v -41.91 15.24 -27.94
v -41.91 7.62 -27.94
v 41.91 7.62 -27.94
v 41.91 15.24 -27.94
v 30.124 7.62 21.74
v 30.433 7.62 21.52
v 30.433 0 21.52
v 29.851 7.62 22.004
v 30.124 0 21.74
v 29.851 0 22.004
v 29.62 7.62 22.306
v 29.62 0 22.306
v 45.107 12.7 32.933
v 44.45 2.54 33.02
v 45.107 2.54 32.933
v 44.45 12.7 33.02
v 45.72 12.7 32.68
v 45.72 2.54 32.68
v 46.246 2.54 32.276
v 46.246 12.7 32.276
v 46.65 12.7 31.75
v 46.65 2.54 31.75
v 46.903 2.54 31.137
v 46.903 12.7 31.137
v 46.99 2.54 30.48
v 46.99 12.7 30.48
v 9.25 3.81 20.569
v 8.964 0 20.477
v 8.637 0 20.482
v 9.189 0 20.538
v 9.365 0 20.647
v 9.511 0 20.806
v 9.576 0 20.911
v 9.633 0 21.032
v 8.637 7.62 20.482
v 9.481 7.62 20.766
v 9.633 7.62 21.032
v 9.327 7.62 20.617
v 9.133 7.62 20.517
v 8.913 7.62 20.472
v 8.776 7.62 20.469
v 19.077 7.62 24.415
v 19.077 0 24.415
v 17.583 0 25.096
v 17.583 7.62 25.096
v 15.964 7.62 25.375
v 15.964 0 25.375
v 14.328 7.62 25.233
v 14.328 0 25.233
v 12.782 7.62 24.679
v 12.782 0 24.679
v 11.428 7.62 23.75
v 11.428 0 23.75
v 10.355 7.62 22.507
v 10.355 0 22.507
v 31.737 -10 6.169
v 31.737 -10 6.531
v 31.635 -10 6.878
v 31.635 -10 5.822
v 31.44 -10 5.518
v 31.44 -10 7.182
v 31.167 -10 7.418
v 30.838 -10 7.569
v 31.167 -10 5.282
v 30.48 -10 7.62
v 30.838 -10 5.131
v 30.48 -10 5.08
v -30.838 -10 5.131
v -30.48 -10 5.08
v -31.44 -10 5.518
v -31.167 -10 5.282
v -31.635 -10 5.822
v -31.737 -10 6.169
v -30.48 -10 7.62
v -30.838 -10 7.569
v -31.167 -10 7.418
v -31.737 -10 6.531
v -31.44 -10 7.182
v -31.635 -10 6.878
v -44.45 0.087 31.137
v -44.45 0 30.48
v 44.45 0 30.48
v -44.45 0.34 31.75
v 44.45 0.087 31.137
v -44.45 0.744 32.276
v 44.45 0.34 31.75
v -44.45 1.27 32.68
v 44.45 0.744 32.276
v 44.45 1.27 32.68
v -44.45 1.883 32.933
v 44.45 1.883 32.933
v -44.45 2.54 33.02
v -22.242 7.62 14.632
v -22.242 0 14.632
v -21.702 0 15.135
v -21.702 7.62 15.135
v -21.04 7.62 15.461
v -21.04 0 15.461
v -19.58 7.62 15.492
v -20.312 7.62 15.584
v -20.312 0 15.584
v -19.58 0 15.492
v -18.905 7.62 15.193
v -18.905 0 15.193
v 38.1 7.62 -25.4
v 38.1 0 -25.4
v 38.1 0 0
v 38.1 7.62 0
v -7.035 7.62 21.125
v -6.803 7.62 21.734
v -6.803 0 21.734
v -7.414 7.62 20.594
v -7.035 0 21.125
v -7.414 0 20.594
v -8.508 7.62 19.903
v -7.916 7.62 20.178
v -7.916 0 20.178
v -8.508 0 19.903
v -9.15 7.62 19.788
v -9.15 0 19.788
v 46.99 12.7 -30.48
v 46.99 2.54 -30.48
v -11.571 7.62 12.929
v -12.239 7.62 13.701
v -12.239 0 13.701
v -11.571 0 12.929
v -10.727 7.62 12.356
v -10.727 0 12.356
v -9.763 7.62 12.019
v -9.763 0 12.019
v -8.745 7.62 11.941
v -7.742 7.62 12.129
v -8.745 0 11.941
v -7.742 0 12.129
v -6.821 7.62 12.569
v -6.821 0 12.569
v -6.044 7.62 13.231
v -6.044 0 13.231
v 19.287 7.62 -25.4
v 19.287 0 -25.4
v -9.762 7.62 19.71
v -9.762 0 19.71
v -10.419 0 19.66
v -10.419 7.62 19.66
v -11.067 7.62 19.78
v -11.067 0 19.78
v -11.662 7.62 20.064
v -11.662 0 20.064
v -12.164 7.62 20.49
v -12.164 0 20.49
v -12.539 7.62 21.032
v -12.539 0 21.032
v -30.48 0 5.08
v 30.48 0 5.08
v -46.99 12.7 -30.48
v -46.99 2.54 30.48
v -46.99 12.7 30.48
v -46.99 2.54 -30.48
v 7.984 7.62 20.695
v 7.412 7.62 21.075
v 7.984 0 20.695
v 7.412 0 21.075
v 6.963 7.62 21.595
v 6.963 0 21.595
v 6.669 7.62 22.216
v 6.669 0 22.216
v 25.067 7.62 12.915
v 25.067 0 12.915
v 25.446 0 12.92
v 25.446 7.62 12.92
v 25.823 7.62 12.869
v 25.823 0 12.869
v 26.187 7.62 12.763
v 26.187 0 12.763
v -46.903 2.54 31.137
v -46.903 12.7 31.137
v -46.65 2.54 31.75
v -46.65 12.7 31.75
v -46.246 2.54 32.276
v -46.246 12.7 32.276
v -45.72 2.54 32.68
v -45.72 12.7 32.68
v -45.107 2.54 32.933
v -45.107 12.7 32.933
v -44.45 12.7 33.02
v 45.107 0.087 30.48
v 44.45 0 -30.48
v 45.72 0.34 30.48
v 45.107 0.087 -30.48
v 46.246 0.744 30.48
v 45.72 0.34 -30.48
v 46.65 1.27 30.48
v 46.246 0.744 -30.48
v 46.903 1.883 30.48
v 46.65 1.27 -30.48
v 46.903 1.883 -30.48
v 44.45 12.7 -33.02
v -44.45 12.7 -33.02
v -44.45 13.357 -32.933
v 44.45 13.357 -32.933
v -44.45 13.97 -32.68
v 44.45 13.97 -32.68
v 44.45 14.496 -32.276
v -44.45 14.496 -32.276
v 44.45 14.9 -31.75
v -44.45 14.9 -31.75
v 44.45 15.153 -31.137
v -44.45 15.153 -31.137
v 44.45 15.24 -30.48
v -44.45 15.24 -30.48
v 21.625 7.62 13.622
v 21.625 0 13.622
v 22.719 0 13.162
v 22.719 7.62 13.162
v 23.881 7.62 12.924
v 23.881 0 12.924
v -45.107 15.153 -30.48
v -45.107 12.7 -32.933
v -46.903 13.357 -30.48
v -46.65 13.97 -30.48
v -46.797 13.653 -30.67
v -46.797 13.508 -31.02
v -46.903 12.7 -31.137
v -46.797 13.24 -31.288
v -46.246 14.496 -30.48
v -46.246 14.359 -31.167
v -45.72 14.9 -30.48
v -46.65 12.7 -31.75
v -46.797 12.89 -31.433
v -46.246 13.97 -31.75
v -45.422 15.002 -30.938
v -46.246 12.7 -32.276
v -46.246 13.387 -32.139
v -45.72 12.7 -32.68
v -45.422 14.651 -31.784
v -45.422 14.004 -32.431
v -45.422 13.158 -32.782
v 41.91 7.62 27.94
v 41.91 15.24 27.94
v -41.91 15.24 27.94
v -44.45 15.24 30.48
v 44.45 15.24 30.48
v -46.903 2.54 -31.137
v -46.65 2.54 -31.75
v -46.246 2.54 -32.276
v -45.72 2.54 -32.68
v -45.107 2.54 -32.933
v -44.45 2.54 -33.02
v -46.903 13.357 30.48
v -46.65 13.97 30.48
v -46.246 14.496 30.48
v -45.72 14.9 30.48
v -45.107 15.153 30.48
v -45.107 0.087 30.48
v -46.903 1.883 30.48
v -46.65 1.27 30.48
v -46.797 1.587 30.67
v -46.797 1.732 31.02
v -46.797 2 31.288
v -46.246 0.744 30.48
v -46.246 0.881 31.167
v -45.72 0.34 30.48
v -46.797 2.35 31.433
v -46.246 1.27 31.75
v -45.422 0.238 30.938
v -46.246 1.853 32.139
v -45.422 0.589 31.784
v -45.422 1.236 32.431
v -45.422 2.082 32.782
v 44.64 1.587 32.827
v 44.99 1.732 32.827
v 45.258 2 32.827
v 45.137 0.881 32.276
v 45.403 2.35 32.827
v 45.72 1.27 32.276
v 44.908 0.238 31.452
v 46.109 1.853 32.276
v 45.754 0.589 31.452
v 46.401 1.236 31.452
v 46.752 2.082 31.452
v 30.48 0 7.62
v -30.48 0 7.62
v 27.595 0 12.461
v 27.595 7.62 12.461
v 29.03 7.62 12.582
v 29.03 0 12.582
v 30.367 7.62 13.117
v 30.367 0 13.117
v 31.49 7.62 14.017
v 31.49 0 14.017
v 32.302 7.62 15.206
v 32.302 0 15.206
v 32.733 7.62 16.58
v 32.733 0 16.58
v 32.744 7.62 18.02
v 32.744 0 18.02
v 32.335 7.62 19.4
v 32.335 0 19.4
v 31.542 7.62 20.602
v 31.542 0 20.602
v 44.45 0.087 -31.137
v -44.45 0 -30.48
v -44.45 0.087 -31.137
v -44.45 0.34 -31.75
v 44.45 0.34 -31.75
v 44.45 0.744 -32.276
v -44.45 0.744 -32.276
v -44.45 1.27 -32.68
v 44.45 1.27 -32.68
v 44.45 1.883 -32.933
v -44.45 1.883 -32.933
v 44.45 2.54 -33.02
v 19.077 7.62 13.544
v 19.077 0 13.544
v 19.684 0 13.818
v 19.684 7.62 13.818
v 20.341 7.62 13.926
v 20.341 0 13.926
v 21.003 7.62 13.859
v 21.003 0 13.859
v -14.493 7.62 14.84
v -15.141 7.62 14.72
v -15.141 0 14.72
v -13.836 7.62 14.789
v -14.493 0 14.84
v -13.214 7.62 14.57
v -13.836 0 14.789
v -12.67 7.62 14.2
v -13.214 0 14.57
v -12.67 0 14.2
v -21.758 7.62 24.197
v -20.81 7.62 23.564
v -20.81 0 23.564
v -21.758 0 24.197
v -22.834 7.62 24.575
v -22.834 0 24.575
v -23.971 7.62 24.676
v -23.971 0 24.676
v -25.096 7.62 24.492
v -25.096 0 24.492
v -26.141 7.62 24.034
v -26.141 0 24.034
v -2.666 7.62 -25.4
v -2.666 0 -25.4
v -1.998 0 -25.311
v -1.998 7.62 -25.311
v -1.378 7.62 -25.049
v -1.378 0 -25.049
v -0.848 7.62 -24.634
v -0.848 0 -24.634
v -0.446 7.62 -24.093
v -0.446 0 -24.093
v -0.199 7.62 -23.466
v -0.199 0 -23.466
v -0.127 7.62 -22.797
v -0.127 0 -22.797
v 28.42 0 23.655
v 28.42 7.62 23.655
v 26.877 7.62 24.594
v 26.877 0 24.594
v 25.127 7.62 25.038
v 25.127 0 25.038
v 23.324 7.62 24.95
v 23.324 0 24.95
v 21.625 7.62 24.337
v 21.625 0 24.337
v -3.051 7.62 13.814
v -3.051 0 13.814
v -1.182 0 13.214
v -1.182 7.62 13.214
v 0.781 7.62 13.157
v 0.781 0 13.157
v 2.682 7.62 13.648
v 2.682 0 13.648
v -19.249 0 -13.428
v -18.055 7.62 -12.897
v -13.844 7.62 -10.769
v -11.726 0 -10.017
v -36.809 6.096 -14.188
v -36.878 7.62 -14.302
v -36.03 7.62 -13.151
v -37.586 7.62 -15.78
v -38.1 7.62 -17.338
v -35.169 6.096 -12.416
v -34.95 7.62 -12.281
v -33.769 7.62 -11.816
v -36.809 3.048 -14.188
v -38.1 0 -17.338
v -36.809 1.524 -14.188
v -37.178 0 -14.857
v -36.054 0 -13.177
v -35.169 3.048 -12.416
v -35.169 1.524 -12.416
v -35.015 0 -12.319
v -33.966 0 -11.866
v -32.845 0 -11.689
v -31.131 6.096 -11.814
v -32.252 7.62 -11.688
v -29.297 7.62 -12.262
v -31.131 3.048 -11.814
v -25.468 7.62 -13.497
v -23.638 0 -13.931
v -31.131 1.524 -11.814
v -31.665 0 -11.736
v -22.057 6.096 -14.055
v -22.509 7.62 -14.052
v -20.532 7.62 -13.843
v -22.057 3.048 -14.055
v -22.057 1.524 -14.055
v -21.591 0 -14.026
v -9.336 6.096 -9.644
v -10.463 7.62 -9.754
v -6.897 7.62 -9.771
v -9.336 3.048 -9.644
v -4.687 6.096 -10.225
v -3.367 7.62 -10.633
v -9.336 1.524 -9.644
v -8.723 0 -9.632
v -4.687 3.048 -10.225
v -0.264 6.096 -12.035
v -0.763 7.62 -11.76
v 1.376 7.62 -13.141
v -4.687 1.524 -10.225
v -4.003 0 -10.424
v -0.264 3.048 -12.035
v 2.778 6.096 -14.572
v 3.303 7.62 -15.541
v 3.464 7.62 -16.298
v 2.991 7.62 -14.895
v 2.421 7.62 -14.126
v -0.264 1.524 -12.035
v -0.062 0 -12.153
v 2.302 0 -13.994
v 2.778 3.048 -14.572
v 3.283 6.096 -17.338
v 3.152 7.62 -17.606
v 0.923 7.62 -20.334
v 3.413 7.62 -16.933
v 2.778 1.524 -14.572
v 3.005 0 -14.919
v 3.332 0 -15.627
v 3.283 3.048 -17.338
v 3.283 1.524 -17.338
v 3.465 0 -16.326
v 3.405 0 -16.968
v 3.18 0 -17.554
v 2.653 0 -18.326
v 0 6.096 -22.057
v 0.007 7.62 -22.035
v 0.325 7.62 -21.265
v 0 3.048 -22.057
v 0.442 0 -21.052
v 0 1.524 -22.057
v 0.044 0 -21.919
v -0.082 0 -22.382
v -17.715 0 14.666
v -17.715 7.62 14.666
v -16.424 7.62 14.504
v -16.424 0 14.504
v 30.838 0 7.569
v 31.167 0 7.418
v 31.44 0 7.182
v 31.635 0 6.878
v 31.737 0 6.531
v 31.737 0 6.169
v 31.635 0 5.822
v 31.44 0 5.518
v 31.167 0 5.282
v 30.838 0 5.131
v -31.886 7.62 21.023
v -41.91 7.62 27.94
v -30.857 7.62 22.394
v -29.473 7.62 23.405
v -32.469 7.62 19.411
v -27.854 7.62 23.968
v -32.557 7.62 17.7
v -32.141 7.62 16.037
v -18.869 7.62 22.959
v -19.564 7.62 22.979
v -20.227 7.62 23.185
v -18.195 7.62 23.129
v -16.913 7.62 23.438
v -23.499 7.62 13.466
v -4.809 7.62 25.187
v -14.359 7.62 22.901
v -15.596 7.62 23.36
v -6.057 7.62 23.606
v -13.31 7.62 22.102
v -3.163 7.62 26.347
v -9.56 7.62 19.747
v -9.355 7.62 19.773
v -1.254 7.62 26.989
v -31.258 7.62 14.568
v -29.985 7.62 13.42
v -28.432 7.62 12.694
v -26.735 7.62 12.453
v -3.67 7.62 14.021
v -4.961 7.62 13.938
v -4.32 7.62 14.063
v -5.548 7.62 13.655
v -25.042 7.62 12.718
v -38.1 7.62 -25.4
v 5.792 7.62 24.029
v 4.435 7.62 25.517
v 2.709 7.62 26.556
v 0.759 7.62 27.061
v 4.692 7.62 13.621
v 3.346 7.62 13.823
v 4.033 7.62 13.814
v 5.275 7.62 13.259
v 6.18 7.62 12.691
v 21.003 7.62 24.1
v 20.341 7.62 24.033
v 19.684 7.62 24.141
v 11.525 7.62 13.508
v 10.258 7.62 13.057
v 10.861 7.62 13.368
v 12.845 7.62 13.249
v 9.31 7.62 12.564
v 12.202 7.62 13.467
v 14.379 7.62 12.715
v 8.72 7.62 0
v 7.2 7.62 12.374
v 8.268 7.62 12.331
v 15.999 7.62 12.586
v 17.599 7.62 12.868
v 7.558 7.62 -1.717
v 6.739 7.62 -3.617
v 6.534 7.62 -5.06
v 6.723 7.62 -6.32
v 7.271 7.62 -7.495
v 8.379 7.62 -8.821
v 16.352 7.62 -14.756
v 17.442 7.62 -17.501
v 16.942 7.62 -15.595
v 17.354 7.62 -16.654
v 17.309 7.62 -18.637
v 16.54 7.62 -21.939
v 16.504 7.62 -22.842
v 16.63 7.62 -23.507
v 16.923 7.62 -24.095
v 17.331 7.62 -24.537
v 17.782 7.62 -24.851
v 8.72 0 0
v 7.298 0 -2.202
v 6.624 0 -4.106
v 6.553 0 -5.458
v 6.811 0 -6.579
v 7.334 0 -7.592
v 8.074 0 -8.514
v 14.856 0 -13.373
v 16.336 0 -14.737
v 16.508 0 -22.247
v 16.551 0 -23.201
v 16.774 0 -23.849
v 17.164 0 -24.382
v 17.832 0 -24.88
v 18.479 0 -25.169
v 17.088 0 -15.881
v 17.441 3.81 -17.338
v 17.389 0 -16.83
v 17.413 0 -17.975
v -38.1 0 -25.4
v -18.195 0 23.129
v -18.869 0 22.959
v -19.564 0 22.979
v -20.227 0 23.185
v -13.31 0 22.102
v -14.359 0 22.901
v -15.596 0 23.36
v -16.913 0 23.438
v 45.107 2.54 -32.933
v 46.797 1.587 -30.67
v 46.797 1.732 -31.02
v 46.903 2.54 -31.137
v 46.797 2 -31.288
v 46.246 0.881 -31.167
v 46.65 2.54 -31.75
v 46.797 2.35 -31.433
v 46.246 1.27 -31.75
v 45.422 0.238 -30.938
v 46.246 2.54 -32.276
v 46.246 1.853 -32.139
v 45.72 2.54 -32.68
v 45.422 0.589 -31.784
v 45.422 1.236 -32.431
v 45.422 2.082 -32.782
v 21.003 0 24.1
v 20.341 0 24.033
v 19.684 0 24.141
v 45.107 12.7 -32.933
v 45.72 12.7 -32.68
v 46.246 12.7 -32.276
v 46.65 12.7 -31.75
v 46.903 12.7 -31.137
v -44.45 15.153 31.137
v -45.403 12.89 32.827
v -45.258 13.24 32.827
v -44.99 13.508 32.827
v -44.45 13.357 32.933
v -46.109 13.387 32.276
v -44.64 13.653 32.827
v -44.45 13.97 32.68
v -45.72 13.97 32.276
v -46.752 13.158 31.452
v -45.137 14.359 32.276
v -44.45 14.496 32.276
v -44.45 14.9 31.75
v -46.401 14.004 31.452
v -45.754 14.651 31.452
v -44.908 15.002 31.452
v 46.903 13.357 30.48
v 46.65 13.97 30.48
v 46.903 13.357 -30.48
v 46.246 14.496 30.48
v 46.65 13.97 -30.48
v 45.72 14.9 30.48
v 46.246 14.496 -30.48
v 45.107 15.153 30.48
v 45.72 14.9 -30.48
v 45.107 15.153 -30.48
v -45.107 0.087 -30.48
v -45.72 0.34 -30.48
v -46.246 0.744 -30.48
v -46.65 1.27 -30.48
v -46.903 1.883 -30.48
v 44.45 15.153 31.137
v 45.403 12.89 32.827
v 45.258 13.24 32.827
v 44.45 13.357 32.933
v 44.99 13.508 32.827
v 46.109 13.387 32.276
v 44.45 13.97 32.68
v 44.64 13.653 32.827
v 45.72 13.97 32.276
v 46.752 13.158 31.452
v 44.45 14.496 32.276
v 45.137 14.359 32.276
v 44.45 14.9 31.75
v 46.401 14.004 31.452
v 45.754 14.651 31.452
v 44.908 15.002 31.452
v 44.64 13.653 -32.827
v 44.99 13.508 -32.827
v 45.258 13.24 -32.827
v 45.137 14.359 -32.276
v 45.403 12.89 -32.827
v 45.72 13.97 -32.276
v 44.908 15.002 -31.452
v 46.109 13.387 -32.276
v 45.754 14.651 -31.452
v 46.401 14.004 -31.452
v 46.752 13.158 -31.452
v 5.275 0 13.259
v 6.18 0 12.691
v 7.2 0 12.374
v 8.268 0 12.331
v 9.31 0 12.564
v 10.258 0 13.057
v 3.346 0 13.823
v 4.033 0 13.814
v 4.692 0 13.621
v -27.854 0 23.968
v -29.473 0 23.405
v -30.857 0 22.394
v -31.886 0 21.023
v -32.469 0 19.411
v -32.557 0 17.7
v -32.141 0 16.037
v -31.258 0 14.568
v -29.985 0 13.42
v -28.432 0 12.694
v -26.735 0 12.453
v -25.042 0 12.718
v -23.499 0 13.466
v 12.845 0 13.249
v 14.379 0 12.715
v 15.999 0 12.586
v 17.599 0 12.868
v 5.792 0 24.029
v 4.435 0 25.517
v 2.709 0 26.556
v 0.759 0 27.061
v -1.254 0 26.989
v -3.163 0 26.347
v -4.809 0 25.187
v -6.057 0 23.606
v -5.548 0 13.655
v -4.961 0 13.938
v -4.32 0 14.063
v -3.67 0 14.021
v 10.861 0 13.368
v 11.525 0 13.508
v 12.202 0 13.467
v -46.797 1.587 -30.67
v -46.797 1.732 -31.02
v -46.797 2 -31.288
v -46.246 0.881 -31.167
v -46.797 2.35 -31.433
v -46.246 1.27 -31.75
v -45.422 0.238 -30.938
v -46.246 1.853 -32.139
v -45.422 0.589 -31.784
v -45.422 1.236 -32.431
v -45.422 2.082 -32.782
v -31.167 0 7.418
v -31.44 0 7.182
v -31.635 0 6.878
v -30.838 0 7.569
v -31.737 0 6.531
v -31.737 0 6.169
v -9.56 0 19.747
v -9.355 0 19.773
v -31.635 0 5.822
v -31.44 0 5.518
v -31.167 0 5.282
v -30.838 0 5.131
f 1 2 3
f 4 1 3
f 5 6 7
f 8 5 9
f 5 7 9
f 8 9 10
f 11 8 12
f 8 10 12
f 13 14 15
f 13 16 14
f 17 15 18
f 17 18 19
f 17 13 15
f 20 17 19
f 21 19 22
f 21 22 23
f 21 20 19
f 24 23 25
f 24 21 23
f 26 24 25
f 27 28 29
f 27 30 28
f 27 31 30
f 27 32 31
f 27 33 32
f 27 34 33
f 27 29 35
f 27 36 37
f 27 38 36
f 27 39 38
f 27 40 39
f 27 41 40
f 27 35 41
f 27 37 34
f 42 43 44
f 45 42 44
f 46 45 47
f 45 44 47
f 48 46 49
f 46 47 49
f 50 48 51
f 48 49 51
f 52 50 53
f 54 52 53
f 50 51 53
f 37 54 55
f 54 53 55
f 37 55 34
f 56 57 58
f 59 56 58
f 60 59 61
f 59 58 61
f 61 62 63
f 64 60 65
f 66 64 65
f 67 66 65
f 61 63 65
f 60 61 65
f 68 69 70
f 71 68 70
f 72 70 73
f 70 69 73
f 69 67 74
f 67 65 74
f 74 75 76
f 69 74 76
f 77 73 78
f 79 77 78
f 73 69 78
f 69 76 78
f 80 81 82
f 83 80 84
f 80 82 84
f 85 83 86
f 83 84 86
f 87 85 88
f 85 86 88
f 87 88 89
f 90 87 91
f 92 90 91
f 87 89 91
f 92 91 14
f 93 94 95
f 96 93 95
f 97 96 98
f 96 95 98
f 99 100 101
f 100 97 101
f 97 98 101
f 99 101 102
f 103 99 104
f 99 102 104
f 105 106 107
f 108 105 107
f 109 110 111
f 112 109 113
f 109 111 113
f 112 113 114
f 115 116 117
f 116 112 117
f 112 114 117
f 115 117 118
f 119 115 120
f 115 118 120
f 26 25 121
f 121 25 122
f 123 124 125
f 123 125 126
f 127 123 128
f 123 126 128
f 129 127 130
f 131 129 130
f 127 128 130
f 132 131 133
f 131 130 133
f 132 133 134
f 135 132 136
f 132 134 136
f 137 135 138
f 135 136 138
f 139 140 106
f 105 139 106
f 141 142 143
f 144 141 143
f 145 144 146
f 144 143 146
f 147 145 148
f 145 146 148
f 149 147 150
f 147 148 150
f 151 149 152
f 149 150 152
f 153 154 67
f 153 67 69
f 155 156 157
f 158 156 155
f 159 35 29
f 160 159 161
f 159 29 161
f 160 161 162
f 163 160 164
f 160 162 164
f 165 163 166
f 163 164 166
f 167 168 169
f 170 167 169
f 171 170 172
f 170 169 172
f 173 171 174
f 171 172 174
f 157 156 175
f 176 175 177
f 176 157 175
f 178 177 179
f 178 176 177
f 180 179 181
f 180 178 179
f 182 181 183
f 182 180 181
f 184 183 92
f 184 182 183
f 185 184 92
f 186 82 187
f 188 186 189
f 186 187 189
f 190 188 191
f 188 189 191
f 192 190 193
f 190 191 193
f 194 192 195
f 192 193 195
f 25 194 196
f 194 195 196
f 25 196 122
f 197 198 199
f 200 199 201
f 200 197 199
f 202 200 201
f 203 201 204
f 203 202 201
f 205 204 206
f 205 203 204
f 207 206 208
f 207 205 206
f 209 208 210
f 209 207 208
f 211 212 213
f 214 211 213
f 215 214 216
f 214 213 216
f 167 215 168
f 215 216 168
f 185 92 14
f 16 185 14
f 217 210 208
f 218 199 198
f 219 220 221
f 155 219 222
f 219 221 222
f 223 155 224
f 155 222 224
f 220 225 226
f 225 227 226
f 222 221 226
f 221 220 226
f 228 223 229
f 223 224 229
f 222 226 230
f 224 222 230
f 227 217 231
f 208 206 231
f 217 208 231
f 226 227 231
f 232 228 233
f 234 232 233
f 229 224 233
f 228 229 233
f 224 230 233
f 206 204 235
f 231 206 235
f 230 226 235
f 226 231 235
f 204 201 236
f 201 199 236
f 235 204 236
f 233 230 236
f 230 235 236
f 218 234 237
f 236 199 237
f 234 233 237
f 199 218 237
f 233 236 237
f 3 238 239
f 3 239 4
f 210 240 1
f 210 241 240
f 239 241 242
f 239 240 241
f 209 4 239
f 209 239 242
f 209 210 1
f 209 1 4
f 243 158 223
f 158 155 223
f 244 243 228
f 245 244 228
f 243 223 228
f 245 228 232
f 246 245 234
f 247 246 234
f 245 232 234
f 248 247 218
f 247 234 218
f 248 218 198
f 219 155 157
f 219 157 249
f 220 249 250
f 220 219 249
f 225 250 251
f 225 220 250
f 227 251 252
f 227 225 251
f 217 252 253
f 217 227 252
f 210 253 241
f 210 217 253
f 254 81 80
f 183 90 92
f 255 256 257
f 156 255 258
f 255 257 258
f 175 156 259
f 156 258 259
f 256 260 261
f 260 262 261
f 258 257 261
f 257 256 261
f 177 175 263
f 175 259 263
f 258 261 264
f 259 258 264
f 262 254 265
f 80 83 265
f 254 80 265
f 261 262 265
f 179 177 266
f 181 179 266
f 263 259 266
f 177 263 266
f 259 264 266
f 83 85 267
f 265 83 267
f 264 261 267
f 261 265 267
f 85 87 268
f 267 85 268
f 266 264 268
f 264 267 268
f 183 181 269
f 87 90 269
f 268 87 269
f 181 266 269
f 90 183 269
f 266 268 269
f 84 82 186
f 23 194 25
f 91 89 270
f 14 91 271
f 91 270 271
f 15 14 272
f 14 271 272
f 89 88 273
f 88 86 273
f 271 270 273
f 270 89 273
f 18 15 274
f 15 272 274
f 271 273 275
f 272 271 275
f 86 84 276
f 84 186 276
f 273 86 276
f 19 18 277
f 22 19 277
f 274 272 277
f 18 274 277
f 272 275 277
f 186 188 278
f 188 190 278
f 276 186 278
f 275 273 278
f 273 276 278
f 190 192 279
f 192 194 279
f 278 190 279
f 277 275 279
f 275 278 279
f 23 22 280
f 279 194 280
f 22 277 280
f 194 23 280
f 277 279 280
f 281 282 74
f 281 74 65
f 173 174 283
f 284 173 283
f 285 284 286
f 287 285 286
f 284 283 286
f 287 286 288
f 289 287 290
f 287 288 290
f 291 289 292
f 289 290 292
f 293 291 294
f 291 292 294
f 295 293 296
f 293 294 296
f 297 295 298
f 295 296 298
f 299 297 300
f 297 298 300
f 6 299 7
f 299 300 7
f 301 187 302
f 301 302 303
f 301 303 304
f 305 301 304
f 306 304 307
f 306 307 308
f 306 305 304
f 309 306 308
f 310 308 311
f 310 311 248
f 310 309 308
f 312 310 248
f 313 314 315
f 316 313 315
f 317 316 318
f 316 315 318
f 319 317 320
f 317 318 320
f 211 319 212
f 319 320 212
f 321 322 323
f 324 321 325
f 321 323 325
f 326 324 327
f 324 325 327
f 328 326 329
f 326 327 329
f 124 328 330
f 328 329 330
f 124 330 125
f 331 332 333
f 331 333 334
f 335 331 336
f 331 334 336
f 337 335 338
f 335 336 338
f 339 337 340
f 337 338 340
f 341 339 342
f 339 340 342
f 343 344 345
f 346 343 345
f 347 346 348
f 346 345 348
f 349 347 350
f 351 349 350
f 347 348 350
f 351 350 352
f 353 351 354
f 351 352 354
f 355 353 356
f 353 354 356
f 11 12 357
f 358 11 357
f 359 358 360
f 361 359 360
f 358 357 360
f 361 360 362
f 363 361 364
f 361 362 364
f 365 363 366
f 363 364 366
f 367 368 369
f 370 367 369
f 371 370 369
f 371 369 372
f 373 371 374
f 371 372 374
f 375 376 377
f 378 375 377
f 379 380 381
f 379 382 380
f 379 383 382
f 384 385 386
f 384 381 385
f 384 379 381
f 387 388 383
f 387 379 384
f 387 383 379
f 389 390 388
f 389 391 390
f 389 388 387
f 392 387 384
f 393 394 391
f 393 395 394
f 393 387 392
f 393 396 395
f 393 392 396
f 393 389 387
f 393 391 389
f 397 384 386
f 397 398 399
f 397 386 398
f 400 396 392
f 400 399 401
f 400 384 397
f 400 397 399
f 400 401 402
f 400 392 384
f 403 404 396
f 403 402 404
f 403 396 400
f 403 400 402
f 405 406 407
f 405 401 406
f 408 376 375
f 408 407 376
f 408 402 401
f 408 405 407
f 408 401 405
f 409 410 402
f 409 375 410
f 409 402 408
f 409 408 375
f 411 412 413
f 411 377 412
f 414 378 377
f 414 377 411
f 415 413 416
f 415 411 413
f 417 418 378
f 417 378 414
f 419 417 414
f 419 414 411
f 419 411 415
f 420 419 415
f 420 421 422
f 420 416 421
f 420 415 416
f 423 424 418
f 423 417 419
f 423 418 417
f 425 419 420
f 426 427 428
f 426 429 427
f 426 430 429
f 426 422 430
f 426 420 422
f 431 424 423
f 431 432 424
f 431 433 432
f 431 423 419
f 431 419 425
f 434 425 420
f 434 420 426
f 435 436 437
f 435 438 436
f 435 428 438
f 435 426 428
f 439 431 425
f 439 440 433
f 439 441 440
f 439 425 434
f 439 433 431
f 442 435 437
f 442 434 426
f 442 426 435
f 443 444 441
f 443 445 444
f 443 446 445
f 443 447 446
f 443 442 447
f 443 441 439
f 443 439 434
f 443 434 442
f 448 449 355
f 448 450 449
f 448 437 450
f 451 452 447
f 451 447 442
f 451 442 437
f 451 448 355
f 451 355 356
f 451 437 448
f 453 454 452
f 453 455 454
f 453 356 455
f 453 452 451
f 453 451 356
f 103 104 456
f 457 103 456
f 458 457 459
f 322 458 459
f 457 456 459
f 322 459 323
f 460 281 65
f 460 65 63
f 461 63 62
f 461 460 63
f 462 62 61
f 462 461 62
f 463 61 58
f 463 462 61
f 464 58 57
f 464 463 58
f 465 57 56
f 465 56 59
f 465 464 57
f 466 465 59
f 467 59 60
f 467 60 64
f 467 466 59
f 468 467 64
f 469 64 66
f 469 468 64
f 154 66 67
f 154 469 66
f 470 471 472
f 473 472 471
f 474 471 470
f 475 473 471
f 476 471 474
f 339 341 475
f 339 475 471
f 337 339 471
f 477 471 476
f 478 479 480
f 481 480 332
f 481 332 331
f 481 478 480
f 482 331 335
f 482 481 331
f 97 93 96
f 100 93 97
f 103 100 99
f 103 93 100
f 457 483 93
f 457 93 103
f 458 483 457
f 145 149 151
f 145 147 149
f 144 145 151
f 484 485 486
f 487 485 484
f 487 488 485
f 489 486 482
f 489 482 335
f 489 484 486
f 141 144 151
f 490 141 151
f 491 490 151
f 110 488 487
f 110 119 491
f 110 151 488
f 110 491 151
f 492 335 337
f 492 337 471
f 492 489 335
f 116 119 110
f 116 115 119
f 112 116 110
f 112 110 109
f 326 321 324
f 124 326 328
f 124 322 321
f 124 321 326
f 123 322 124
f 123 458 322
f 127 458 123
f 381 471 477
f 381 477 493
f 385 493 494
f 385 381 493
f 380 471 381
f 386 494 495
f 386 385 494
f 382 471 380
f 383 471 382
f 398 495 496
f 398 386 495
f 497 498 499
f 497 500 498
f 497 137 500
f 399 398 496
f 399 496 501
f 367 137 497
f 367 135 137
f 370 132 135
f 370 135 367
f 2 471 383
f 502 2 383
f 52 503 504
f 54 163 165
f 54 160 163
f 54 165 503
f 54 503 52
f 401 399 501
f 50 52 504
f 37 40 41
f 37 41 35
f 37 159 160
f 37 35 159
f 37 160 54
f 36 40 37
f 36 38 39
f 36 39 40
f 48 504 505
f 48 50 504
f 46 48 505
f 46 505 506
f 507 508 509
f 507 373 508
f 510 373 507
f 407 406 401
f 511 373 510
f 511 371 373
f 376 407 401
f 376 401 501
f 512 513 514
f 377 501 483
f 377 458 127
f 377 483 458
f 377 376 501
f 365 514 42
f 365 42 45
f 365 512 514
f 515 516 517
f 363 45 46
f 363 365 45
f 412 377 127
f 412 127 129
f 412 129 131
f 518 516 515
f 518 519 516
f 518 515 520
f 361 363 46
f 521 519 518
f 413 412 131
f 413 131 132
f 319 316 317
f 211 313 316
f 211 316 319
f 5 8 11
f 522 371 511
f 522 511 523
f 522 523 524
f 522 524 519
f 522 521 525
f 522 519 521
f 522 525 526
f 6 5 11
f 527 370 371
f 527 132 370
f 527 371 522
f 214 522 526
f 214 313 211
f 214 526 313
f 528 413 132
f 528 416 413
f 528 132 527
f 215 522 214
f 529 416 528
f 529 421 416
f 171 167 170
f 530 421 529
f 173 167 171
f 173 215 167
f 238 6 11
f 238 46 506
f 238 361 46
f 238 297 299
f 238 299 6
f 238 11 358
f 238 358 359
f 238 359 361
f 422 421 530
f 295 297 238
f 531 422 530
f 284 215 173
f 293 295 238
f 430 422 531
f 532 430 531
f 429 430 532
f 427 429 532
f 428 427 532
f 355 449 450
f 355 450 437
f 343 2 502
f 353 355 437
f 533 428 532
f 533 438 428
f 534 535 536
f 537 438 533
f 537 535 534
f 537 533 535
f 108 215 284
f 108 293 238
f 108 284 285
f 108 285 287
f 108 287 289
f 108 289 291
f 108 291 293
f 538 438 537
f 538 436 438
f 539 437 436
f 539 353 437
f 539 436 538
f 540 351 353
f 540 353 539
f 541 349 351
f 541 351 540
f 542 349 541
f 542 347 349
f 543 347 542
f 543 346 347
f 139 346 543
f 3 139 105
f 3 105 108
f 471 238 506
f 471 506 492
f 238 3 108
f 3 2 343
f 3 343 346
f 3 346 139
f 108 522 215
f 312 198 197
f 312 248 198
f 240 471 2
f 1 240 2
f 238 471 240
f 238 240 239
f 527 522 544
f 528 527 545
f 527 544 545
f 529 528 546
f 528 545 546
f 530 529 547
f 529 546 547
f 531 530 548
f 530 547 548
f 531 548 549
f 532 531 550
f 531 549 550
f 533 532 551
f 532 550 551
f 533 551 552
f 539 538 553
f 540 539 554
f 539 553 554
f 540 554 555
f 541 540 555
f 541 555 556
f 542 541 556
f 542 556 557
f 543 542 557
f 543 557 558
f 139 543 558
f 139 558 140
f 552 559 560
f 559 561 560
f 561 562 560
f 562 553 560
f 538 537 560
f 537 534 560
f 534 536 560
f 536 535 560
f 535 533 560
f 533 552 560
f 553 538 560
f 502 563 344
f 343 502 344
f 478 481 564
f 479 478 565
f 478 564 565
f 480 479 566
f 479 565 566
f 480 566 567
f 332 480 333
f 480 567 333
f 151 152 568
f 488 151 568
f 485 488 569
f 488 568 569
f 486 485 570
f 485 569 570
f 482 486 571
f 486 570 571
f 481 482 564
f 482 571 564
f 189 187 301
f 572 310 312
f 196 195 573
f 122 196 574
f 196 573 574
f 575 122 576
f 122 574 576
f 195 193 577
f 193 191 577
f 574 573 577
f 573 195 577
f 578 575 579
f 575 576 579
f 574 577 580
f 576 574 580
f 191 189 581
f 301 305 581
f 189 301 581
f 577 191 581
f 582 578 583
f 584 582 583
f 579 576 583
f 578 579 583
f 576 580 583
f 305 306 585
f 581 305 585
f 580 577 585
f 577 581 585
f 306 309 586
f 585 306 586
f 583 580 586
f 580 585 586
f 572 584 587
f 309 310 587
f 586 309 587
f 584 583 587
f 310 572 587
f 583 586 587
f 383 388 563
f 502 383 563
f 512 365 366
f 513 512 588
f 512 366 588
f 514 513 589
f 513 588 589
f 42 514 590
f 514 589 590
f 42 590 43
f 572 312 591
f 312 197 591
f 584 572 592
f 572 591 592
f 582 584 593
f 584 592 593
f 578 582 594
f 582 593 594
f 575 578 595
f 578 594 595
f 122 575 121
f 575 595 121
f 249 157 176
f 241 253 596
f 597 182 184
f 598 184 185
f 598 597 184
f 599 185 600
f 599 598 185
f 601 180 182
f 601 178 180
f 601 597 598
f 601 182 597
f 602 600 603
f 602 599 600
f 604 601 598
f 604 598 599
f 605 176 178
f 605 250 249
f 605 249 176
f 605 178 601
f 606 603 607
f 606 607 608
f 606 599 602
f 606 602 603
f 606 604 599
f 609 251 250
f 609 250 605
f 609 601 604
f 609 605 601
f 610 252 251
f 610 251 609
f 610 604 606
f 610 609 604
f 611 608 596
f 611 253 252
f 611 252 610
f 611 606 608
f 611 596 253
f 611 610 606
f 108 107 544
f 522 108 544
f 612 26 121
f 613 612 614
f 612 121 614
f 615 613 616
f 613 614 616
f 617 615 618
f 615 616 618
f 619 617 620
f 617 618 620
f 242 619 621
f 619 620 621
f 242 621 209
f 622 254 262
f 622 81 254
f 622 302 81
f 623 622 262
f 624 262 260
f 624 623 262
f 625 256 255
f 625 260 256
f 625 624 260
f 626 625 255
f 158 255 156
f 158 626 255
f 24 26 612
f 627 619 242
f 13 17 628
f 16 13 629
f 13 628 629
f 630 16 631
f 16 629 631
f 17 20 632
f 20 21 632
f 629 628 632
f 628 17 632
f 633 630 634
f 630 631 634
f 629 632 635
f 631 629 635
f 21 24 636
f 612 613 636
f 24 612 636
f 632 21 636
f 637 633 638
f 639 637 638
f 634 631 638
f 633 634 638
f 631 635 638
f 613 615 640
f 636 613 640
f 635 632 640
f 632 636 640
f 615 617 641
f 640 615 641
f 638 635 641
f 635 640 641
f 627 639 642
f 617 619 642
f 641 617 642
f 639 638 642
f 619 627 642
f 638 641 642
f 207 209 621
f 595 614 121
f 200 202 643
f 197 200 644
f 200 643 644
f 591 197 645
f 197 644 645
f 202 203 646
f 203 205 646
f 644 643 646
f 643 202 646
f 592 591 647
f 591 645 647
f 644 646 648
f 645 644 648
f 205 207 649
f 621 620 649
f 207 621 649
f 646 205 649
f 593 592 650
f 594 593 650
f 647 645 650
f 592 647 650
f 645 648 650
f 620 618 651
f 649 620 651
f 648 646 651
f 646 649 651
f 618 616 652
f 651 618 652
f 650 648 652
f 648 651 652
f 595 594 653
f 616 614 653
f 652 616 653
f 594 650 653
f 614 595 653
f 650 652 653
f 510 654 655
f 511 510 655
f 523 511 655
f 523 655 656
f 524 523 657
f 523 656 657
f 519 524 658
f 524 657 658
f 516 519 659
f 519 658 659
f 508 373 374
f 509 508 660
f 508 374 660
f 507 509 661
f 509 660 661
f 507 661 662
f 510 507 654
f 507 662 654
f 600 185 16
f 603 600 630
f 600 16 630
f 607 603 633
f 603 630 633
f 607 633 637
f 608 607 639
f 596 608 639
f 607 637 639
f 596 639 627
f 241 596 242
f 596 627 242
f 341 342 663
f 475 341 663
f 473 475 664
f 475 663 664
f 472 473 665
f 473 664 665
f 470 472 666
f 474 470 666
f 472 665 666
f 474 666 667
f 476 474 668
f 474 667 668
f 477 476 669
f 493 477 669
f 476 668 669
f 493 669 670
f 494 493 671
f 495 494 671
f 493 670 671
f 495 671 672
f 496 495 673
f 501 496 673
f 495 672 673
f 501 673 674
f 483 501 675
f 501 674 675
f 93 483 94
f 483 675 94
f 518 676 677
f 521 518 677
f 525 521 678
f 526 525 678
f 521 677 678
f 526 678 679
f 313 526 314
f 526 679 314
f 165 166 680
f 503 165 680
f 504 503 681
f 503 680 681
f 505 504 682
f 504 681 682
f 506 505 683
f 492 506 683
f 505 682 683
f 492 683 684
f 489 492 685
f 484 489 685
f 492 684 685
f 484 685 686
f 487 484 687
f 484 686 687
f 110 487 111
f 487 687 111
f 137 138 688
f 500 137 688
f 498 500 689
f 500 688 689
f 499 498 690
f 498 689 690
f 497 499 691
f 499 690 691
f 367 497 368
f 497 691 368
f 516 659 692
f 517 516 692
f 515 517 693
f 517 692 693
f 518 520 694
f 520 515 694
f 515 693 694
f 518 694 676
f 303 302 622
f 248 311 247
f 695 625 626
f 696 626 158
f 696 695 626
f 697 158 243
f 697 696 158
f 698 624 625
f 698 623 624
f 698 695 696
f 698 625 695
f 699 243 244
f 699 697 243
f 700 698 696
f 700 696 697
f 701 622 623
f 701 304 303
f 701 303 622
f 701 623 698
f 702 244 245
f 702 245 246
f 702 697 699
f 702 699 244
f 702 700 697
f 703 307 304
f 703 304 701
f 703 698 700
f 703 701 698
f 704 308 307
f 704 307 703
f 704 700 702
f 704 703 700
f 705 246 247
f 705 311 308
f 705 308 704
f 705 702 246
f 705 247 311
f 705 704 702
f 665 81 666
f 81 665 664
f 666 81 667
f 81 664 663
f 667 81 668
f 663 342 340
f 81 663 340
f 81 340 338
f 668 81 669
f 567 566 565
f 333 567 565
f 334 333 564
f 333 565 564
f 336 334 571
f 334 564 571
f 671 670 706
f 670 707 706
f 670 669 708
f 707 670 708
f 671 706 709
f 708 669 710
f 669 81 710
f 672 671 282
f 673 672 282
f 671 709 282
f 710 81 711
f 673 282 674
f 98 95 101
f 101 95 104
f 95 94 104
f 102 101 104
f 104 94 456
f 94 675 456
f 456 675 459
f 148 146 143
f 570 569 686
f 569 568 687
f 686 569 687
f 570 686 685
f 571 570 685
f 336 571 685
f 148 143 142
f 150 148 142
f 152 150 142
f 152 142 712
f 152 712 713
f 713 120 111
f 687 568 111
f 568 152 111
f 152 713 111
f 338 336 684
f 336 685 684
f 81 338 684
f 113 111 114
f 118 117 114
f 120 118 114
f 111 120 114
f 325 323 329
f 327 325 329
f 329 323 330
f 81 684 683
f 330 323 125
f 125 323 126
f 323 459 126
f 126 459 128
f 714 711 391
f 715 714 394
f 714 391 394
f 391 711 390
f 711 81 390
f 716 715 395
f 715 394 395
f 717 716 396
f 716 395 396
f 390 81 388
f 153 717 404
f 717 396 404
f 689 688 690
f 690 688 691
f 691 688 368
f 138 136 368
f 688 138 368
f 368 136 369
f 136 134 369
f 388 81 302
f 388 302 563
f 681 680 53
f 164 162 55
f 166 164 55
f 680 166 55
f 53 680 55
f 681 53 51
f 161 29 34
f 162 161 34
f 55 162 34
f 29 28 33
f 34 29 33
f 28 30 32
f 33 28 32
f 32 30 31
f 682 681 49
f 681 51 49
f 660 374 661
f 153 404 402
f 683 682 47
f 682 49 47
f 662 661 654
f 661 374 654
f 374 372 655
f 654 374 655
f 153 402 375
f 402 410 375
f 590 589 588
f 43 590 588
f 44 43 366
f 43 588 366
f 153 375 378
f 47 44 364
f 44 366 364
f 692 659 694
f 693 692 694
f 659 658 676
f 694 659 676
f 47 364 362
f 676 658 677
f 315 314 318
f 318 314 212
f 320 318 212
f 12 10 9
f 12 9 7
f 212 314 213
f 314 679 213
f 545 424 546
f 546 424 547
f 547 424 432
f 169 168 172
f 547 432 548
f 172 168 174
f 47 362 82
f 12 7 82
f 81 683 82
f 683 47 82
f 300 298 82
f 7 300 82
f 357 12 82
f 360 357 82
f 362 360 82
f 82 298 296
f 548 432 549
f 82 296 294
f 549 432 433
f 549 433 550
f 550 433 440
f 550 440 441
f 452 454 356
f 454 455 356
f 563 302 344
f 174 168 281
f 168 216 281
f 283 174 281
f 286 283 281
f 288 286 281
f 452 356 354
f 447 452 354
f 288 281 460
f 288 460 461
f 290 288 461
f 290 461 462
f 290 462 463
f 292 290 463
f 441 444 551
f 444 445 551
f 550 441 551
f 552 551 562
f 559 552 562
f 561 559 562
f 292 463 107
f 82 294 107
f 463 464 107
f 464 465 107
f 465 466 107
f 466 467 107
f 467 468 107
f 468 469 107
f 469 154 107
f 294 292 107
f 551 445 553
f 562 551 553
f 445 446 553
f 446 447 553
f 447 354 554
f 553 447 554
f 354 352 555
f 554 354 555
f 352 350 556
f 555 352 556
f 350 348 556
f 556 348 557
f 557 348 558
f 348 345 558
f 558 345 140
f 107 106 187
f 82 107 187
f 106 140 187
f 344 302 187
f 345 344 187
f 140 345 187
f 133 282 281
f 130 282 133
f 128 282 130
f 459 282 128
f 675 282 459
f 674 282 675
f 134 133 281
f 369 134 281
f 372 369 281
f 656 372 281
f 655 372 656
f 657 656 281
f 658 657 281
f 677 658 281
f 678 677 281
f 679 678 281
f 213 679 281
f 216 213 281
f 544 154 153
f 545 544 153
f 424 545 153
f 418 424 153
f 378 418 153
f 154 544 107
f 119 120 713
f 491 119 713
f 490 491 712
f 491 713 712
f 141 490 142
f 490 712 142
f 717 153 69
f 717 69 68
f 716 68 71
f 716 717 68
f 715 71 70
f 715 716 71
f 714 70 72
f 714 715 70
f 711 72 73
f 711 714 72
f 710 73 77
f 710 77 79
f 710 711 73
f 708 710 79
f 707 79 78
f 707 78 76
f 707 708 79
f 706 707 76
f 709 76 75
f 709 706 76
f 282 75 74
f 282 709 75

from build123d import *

# Parameters (mm, degrees)
SKETCH1_W           = 93.98
SKETCH1_H           = 66.04
SKETCH1_W_2         = 83.82
SKETCH1_H_2         = 55.88
BOSS_EXTRUDE1_DEPTH = 15.24
SKETCH3_W           = 83.82
SKETCH3_H           = 55.88
BOSS_EXTRUDE2_DEPTH = 7.62
BOSS_EXTRUDE3_DEPTH = 10
FILLET1_R           = 2.54
CUT_EXTRUDE1_DEPTH  = 16.24


with BuildPart() as part:
    # Sketch1 → Boss-Extrude1 (new body)
    with BuildSketch(Plane(origin=(0, 0, 0), x_dir=(1, 0, 0), z_dir=(0, 1, 0))):
        Rectangle(SKETCH1_W, SKETCH1_H)
        Rectangle(SKETCH1_W_2, SKETCH1_H_2, mode=Mode.SUBTRACT)
    extrude(amount=BOSS_EXTRUDE1_DEPTH)

    # Sketch3 → Boss-Extrude2 (add)
    with BuildSketch(Plane(origin=(0, 0, 0), x_dir=(1, 0, 0), z_dir=(0, 1, 0))):
        Rectangle(SKETCH3_W, SKETCH3_H)
    extrude(amount=BOSS_EXTRUDE2_DEPTH)

    # Sketch4 → Boss-Extrude3 (add)
    with BuildSketch(Plane.XZ):
        with BuildLine():
            Line((-30.48, 7.62), (30.48, 7.62))
            ThreePointArc((30.48, 7.62), (31.75, 6.35), (30.48, 5.08))
            Line((30.48, 5.08), (-30.48, 5.08))
            ThreePointArc((-30.48, 5.08), (-31.75, 6.35), (-30.48, 7.62))
        make_face()
    extrude(amount=BOSS_EXTRUDE3_DEPTH)

    # Fillet1
    fillet1_edges = [part.edges().sort_by_distance(p)[0] for p in [
        (46.99, 15.24, 0),
        (0, 15.24, -33.02),
        (-46.99, 15.24, 0),
        (0, 0, -33.02),
        (46.99, 0, 0),
        (0, 0, 33.02),
        (-46.99, 0, 0),
        (-46.99, 7.62, -33.02),
        (46.99, 7.62, -33.02),
        (46.99, 7.62, 33.02),
        (-46.99, 7.62, 33.02),
        (0, 15.24, 33.02),
    ]]
    fillet(fillet1_edges, radius=FILLET1_R)

    # Sketch5 → Cut-Extrude1 (cut, through all)
    with BuildSketch(Plane.XZ):
        with BuildLine():
            Line((38.1, 0), (8.720286281, 0))
            add(Edge.make_bspline(
                [(8.720286281, 0), (0.717932636, -10.320966423), (24.690327376, -11.221788079), (14.302617373, -24.27956655), (19.287221421, -25.4)],
                knots=[0, 0, 0, 0, 0.689243554, 1, 1, 1, 1], degree=3))
            Line((19.287221421, -25.4), (38.1, -25.4))
            Line((38.1, -25.4), (38.1, 0))
        make_face()
        with BuildLine():
            add(Edge.make_bspline(
                [(-38.1, -17.337980958), (-35.187970865, -6.837732589), (-22.396079464, -19.547216799), (-11.076568018, -5.424698839), (8.04848315, -15.407822573), (0.32989112, -20.213116903), (-0.131881687, -22.594944987), (-0.12685046, -22.796669294)],
                knots=[0, 0, 0, 0, 0.327916539, 0.565865574, 0.827054789, 0.928649045, 0.941908126, 0.941908126, 0.941908126, 0.941908126], degree=3))
            Line((-38.1, -17.337980958), (-38.1, -25.4))
            Line((-38.1, -25.4), (-2.666060814, -25.4))
            ThreePointArc((-2.666060814, -25.4), (-0.84775666, -24.633519101), (-0.12685046, -22.796669294))
        make_face()
        with BuildLine():
            ThreePointArc((-20.809664595, 23.563761473), (-23.399285475, 24.661043475), (-26.141098135, 24.03444358))
            ThreePointArc((-26.141098135, 24.03444358), (-32.141459521, 16.03667712), (-22.24223462, 14.631703292))
            ThreePointArc((-22.24223462, 14.631703292), (-20.680528135, 15.549204987), (-18.904626197, 15.192962357))
            ThreePointArc((-18.904626197, 15.192962357), (-17.075188661, 14.538079772), (-15.140614659, 14.720113645))
            ThreePointArc((-15.140614659, 14.720113645), (-13.518109108, 14.699820982), (-12.238965098, 13.701458994))
            ThreePointArc((-12.238965098, 13.701458994), (-9.256805246, 11.946815164), (-6.043815629, 13.230851799))
            ThreePointArc((-6.043815629, 13.230851799), (-4.644606266, 14.021459072), (-3.050933479, 13.813965102))
            ThreePointArc((-3.050933479, 13.813965102), (-0.202264641, 13.116417687), (2.681966092, 13.648112737))
            ThreePointArc((2.681966092, 13.648112737), (4.032557322, 13.814175625), (5.275046214, 13.259292838))
            ThreePointArc((5.275046214, 13.259292838), (7.732359851, 12.317746114), (10.257976284, 13.056773974))
            ThreePointArc((10.257976284, 13.056773974), (11.524940775, 13.507829697), (12.844614733, 13.248771918))
            ThreePointArc((12.844614733, 13.248771918), (15.999143067, 12.5855131), (19.076925277, 13.543749992))
            ThreePointArc((19.076925277, 13.543749992), (20.340690392, 13.925639815), (21.625421379, 13.621652327))
            ThreePointArc((21.625421379, 13.621652327), (23.29387293, 13.01462201), (25.066504565, 12.914654647))
            ThreePointArc((25.066504565, 12.914654647), (25.635512485, 12.901960546), (26.187409107, 12.762887643))
            ThreePointArc((26.187409107, 12.762887643), (32.302173237, 15.205977496), (30.433254549, 21.519943868))
            ThreePointArc((30.433254549, 21.519943868), (29.982257618, 21.867122384), (29.619886936, 22.306005788))
            ThreePointArc((29.619886936, 22.306005788), (26.018947716, 24.881341954), (21.625421379, 24.337240894))
            ThreePointArc((21.625421379, 24.337240894), (20.340690392, 24.033253406), (19.076925277, 24.415143229))
            ThreePointArc((19.076925277, 24.415143229), (13.537462145, 25.005428585), (9.633287177, 21.031575742))
            add(Edge.make_bspline(
                [(8.636564486, 20.482159427), (9.365510622, 20.380358696), (9.633287177, 21.031575742)],
                knots=[0, 0, 0, 1, 1, 1], degree=2))
            ThreePointArc((8.636564486, 20.482159427), (7.41195629, 21.075462315), (6.669321907, 22.215711291))
            ThreePointArc((6.669321907, 22.215711291), (-0.249726214, 27.097956484), (-6.802730996, 21.734406043))
            ThreePointArc((-6.802730996, 21.734406043), (-7.651745104, 20.369846866), (-9.149857761, 19.788034897))
            ThreePointArc((-9.149857761, 19.788034897), (-9.457684051, 19.760912808), (-9.762426275, 19.709679919))
            ThreePointArc((-9.762426275, 19.709679919), (-11.373542368, 19.902659169), (-12.539082341, 21.031575742))
            ThreePointArc((-12.539082341, 21.031575742), (-14.960654672, 23.176356644), (-18.19513891, 23.129352581))
            ThreePointArc((-18.19513891, 23.129352581), (-19.563553579, 22.978509725), (-20.809664595, 23.563761473))
        make_face()
    extrude(amount=-CUT_EXTRUDE1_DEPTH, mode=Mode.SUBTRACT)


solid = part.part
